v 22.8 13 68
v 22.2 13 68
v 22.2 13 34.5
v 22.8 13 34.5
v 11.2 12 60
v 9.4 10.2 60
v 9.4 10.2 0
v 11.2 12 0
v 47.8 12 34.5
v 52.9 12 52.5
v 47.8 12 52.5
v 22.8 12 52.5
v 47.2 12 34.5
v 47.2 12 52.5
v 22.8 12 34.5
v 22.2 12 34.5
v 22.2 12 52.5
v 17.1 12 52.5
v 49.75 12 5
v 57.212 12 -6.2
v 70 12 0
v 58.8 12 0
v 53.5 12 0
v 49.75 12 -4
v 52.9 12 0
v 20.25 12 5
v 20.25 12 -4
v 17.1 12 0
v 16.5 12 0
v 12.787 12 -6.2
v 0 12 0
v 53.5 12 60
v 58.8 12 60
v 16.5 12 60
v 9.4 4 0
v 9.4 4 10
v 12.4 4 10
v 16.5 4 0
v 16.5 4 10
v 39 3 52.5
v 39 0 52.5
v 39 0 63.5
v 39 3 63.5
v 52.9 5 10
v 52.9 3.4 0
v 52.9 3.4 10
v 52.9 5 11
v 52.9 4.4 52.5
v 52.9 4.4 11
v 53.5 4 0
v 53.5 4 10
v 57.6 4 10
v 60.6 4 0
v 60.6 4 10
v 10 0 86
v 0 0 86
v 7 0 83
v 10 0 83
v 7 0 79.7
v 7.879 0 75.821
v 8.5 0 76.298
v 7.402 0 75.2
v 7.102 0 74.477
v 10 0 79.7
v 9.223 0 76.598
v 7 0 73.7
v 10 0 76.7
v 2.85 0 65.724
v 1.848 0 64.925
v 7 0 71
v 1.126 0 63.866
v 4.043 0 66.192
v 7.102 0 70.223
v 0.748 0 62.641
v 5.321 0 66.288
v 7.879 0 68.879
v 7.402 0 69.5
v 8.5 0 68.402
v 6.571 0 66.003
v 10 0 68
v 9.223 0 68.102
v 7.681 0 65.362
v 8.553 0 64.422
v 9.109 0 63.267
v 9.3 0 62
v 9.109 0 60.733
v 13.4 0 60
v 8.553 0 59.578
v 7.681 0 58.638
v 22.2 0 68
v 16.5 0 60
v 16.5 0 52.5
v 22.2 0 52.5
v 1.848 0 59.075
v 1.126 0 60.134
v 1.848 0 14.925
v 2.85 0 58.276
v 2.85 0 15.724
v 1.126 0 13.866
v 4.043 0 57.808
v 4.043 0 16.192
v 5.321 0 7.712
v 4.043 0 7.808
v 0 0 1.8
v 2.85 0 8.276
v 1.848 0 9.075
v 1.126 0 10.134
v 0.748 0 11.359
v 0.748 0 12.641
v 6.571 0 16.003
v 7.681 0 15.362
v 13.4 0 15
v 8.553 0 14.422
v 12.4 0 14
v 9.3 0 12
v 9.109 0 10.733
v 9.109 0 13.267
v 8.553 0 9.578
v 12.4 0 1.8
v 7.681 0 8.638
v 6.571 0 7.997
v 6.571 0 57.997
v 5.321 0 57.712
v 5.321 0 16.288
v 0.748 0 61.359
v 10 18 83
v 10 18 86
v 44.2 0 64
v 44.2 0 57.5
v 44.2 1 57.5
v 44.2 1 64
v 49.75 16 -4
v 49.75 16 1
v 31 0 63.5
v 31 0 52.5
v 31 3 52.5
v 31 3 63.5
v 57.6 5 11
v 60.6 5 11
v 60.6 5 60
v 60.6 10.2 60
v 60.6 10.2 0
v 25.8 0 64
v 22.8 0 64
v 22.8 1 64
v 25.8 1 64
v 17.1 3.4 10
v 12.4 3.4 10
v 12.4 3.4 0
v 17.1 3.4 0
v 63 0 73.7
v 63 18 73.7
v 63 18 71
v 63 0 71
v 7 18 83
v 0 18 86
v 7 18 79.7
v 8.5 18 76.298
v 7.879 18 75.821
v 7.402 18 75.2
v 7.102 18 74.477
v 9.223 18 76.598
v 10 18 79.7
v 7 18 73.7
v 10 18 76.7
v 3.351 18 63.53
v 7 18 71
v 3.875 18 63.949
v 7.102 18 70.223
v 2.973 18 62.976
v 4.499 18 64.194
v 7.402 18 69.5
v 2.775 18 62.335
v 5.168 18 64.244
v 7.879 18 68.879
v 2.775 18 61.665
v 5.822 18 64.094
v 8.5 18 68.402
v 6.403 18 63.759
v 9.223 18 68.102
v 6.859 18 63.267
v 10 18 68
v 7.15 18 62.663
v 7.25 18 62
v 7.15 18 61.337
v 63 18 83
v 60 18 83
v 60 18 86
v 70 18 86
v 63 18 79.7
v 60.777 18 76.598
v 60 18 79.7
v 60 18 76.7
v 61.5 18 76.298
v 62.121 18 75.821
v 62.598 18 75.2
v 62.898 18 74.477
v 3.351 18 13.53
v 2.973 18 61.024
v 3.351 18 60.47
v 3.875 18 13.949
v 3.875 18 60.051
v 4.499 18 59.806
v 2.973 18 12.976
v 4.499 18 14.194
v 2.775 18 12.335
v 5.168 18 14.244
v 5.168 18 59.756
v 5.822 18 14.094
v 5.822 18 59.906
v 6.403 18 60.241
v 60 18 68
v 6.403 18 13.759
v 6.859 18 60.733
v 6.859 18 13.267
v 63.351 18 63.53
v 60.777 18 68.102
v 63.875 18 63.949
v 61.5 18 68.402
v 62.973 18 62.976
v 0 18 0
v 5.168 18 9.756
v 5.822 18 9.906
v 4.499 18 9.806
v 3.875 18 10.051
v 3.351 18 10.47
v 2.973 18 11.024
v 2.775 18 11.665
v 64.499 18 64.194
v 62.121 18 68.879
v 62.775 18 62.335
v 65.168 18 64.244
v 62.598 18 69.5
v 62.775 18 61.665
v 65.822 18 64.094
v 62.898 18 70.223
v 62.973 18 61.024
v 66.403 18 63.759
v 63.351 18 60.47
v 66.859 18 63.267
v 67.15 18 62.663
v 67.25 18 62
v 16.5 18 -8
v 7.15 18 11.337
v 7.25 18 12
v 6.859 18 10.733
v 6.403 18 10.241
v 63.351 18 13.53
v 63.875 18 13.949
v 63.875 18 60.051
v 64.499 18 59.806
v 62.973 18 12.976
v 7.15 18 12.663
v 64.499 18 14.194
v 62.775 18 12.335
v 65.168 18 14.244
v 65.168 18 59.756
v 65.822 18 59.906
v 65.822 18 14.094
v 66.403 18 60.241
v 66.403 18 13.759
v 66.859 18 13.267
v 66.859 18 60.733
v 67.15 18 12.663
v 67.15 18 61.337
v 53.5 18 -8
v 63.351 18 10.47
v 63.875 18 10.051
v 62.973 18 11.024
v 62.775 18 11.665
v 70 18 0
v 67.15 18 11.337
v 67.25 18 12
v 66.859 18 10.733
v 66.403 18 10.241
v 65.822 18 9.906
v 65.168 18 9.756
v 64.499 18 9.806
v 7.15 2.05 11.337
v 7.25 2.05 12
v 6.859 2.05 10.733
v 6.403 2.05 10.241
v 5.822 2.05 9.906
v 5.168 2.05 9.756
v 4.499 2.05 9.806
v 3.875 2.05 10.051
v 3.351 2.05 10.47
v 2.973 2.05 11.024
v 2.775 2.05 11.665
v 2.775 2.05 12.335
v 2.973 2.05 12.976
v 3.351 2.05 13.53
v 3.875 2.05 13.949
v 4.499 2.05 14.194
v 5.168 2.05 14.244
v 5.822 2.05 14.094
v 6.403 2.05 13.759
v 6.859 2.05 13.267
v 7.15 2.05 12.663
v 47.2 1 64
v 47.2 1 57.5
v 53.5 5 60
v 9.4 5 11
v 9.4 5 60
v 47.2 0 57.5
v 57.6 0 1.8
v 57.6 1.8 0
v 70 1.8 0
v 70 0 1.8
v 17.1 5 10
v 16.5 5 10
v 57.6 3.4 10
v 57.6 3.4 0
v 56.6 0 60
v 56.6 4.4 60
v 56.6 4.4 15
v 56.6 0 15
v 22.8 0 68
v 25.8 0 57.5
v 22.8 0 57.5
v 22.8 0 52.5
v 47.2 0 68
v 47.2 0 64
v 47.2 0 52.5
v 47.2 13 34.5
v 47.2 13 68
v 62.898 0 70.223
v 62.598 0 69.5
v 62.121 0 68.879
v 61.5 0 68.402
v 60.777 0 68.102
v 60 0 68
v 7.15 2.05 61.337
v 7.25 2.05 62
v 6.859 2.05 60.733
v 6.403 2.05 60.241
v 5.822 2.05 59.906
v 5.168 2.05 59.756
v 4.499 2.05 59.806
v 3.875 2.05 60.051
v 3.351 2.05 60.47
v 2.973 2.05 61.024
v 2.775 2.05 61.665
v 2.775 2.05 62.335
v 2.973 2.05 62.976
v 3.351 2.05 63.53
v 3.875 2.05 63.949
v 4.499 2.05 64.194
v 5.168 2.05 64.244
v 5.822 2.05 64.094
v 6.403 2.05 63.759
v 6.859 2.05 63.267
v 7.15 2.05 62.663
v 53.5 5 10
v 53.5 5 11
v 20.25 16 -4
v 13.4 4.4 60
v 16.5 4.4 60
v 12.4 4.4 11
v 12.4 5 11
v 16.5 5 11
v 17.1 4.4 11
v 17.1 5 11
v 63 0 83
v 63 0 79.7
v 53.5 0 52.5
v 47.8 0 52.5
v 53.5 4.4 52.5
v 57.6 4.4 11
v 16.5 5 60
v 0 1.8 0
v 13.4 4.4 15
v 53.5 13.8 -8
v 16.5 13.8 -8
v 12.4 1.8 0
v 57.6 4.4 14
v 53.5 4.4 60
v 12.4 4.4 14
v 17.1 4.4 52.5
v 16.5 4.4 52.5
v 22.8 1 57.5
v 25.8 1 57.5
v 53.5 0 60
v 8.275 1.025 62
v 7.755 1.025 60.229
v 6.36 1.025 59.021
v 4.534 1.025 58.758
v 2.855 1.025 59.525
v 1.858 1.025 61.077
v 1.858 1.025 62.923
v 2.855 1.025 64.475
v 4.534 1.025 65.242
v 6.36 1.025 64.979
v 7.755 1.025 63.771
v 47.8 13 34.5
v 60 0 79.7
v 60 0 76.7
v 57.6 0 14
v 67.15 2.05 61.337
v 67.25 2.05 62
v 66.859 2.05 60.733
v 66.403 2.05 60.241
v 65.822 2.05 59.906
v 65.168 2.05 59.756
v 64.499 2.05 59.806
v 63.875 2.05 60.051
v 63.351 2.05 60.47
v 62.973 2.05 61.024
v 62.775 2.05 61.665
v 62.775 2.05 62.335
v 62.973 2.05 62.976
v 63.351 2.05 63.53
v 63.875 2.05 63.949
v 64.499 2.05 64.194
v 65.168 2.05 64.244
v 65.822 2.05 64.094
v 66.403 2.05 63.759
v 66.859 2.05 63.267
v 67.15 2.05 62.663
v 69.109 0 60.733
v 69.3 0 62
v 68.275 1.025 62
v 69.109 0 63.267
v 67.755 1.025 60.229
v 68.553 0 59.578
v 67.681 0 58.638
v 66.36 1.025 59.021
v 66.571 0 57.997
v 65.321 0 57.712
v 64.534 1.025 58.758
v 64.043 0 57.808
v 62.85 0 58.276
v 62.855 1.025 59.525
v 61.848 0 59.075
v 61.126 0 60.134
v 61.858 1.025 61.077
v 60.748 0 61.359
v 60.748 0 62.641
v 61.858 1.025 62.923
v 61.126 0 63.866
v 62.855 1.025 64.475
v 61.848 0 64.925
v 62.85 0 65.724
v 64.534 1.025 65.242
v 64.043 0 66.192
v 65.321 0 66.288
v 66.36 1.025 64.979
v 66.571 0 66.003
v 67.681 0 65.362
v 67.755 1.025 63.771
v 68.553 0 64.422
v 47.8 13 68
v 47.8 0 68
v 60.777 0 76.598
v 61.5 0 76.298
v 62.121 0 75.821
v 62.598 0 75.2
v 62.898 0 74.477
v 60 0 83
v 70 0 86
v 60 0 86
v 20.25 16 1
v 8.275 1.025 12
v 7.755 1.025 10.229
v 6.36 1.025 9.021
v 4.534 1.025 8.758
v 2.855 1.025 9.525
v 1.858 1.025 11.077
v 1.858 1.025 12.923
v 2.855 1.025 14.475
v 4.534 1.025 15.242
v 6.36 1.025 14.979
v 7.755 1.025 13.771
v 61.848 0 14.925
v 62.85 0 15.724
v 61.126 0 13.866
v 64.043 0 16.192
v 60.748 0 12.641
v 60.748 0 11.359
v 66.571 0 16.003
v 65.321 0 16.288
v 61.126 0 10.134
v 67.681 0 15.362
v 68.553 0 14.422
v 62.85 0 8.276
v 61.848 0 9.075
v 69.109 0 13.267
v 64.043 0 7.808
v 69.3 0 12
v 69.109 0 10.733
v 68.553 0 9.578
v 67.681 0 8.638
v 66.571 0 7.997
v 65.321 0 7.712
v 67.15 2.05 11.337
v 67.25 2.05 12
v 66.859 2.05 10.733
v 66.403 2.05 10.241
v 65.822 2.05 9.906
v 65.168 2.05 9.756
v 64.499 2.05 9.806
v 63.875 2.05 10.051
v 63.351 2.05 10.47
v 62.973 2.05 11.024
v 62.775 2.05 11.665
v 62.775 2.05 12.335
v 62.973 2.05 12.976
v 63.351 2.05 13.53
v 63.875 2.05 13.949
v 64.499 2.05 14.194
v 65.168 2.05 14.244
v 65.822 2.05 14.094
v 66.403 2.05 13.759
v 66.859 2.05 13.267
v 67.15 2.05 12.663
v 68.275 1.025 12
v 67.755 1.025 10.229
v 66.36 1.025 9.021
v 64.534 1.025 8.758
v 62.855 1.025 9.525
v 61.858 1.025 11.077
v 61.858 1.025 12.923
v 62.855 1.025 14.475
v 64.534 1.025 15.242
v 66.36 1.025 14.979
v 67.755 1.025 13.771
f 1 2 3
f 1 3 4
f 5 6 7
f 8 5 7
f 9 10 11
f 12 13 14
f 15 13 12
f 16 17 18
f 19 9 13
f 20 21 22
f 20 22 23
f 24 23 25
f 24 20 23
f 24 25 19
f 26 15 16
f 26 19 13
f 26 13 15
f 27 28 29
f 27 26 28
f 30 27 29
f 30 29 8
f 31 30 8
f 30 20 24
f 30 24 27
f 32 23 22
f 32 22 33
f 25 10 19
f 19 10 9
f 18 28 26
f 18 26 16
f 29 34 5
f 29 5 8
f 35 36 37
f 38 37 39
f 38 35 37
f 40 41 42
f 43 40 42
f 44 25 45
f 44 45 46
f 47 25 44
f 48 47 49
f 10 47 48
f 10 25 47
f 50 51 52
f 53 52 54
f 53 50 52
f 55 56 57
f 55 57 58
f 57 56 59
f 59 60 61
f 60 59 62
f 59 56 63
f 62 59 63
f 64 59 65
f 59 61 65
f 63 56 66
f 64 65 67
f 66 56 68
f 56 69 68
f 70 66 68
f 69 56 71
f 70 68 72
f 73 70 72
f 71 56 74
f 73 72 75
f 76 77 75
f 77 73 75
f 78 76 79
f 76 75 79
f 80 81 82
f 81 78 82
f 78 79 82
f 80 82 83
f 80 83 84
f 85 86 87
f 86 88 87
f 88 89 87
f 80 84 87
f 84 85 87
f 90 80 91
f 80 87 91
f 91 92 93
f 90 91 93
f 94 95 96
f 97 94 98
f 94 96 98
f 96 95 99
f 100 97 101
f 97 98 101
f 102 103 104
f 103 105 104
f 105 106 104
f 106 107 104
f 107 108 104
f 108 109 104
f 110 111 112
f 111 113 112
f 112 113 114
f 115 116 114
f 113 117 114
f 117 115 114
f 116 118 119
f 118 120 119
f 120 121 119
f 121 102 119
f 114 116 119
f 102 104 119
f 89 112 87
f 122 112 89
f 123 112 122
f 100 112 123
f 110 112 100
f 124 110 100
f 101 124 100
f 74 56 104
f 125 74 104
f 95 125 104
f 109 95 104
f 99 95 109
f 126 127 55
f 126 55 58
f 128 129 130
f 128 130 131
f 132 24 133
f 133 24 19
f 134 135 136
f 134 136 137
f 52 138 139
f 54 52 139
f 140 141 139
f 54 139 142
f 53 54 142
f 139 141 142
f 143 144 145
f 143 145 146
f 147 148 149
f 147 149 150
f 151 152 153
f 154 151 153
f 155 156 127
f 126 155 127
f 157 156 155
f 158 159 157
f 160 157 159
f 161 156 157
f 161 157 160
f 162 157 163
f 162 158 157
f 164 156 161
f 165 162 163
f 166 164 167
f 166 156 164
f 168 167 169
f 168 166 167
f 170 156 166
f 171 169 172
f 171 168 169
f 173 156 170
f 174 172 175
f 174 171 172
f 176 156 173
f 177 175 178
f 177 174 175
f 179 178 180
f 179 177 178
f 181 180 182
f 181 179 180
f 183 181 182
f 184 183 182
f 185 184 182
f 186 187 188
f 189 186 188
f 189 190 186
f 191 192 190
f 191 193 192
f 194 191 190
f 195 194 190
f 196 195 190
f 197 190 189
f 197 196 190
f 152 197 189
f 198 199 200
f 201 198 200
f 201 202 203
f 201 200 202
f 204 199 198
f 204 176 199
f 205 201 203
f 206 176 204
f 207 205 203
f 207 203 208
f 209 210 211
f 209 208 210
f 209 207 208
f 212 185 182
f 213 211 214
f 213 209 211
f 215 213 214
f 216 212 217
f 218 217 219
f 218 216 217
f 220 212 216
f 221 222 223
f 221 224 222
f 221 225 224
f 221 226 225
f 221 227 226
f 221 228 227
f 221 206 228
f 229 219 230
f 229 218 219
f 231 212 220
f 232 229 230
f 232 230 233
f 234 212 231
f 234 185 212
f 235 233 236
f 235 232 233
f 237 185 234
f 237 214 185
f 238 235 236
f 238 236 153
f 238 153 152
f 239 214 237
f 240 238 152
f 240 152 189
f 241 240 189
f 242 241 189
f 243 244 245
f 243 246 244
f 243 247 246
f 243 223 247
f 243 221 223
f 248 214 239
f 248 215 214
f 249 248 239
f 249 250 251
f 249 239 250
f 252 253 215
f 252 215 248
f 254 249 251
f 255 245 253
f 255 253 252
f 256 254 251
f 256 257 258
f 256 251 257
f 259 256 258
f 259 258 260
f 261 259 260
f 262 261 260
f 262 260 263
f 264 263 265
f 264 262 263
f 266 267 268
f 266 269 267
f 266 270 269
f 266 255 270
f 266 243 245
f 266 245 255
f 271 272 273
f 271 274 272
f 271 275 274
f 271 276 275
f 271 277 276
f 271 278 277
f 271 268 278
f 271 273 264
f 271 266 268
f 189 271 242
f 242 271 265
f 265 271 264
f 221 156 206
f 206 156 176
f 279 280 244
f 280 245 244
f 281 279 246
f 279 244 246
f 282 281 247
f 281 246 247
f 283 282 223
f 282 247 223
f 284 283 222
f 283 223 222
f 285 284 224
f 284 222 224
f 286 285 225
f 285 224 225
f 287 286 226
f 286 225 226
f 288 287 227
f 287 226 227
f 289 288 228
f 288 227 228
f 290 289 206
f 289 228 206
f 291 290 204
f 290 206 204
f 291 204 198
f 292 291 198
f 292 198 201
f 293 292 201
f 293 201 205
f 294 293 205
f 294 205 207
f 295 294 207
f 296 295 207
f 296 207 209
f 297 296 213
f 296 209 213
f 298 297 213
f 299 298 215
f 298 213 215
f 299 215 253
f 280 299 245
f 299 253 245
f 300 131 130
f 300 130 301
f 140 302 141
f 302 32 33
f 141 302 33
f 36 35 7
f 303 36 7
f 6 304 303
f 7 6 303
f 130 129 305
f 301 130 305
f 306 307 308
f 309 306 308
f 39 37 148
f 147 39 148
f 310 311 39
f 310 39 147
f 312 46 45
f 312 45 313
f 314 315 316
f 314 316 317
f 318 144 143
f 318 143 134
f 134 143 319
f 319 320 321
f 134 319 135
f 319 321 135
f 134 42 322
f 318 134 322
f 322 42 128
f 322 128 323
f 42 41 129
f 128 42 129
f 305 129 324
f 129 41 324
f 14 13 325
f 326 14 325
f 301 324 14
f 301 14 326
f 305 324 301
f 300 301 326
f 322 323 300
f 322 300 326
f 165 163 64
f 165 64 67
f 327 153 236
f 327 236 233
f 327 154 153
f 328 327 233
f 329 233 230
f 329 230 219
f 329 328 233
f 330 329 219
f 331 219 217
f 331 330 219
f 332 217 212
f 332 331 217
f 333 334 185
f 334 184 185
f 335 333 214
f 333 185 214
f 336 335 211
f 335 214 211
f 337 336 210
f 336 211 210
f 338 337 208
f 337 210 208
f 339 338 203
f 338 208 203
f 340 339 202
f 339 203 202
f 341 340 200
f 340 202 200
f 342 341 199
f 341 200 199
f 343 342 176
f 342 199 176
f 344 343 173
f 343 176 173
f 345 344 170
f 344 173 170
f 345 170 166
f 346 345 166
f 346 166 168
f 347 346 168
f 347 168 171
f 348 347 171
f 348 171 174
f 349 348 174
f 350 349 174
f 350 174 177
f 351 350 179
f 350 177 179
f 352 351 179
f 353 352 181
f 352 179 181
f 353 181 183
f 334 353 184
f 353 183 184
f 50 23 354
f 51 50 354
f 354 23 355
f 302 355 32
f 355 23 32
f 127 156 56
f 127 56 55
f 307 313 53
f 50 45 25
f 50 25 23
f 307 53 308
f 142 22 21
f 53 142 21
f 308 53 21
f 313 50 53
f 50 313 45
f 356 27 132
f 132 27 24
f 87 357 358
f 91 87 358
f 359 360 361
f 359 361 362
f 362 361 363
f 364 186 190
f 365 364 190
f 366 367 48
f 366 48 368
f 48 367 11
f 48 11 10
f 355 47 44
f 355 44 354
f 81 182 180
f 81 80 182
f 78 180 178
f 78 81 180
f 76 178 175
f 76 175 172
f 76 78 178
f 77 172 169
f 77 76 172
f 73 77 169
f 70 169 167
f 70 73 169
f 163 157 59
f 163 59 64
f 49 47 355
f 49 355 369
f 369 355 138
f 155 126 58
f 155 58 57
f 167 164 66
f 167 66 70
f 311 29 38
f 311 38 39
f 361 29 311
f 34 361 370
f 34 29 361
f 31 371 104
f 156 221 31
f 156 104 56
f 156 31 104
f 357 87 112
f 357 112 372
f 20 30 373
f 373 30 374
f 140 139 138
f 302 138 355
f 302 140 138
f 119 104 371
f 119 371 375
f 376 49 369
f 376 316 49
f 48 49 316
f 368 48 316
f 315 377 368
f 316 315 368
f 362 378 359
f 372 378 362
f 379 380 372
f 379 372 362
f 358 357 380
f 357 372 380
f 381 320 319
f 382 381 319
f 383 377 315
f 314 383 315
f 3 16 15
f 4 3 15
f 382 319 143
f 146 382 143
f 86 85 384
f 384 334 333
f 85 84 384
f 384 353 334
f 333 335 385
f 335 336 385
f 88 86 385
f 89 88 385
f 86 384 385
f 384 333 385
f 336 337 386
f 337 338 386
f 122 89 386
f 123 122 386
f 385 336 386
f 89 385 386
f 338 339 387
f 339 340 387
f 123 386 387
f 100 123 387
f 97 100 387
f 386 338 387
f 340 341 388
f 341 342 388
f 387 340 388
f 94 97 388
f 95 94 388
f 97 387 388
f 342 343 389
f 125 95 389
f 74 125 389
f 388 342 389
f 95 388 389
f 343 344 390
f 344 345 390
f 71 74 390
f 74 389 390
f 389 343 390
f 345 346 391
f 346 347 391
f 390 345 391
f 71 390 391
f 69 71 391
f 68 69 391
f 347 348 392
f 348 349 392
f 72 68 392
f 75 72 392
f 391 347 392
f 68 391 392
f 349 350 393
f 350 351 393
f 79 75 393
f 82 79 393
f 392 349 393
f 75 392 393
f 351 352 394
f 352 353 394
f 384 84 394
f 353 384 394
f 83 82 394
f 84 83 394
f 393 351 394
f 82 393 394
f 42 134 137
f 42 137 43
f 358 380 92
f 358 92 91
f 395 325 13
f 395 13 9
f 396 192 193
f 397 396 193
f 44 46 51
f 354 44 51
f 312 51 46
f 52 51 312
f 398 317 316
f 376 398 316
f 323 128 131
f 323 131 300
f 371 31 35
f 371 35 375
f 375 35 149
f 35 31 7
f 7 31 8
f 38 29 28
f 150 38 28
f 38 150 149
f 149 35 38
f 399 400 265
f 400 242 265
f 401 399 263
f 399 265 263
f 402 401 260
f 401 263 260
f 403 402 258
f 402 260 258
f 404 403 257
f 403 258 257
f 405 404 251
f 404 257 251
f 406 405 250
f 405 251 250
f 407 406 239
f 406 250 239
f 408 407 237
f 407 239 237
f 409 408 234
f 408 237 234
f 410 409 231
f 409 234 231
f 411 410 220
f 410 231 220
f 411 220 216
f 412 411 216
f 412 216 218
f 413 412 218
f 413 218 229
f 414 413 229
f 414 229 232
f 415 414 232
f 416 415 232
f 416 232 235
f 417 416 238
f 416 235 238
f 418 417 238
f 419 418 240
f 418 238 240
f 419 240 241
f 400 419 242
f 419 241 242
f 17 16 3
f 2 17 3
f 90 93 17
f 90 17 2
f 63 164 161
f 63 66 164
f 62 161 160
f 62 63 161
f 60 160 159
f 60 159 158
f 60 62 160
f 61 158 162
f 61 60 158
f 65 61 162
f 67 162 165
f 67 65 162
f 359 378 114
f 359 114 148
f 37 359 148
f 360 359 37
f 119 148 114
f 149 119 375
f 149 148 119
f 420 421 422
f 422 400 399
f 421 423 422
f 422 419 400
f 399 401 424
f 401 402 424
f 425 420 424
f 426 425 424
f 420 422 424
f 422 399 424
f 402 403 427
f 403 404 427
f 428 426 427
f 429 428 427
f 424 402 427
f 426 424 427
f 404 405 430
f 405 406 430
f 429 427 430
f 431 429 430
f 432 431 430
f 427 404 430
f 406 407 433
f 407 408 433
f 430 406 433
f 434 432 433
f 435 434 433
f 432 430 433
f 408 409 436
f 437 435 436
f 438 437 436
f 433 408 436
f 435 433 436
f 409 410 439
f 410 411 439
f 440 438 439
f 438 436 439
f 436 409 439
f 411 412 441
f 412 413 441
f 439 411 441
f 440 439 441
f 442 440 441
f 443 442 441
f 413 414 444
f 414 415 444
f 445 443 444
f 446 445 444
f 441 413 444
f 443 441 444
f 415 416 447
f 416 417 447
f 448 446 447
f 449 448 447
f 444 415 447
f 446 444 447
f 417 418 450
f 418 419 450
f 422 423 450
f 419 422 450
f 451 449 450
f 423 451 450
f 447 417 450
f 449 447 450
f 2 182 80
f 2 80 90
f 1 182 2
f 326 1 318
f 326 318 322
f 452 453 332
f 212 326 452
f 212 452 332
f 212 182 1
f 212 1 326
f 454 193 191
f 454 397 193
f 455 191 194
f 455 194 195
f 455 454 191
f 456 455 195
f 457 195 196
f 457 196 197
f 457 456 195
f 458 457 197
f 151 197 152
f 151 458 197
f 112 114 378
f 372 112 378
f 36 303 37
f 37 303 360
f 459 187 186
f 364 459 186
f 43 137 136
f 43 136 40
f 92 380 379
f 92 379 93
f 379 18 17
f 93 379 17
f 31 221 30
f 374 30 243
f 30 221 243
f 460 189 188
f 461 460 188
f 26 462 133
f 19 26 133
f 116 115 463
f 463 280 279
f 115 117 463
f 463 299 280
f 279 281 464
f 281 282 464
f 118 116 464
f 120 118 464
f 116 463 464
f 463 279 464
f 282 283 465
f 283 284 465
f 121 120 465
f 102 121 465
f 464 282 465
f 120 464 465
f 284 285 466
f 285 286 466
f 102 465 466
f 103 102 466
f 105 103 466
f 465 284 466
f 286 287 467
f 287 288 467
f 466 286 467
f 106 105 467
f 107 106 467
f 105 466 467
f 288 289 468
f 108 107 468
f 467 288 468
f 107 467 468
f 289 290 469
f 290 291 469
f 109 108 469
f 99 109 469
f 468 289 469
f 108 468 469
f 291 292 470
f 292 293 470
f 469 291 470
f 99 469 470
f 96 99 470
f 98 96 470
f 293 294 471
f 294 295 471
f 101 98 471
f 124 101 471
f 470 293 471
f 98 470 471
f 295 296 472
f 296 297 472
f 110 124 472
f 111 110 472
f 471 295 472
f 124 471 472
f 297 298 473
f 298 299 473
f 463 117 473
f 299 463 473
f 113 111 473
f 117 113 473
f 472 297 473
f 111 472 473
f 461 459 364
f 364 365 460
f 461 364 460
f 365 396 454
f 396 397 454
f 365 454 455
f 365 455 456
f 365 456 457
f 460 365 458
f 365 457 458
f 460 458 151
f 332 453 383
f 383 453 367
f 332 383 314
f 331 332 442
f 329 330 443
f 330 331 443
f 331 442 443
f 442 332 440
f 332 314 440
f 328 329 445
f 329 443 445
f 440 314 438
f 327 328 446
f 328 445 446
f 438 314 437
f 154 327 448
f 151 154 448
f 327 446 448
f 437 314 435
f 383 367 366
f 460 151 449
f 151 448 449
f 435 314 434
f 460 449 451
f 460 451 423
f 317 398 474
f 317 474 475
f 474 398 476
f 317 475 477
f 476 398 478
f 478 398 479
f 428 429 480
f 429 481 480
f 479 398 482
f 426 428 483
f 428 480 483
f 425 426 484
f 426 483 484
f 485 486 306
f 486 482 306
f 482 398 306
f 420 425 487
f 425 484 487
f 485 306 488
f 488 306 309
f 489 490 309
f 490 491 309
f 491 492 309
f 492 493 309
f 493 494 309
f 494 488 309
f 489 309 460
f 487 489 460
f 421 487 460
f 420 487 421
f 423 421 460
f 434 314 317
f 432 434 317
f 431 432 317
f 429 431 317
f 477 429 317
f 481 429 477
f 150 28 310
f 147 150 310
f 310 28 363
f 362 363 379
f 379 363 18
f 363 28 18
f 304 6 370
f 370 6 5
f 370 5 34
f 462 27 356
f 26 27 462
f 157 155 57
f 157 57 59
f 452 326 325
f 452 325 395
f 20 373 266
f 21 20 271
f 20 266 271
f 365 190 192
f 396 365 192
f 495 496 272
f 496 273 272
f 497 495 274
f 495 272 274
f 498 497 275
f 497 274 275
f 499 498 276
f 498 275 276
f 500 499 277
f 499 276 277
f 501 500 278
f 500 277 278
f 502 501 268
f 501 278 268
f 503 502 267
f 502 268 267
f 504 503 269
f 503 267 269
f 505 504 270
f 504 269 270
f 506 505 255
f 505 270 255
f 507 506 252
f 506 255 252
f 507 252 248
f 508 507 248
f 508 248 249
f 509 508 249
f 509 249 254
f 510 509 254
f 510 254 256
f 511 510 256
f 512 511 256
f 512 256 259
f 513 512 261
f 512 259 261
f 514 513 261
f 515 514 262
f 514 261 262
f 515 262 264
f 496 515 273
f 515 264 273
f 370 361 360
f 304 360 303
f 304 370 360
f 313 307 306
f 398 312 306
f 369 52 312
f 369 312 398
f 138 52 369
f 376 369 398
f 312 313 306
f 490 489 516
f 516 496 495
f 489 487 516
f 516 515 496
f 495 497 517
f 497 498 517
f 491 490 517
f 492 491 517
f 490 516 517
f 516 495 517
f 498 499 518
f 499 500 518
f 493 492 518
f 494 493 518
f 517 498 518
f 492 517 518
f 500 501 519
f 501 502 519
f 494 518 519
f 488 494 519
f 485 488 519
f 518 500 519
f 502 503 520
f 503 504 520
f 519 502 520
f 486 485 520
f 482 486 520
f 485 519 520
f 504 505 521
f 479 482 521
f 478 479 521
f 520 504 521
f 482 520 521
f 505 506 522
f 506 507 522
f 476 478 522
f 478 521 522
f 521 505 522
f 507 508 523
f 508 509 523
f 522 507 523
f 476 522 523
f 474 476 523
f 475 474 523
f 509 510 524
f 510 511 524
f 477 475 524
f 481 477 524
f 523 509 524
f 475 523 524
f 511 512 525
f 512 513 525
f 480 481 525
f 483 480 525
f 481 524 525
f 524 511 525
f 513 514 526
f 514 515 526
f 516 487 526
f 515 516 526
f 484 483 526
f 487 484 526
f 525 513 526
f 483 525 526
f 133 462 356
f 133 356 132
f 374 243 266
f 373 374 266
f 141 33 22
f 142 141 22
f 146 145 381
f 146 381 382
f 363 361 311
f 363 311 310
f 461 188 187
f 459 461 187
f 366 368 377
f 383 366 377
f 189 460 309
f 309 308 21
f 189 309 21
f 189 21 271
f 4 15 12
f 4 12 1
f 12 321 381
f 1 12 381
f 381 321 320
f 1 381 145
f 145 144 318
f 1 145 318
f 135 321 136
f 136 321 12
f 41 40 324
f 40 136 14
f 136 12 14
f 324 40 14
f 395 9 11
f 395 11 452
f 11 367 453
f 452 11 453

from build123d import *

# Parameters (mm, degrees)
SKETCH_1_W                = 70
SKETCH_1_H                = 18
EXTRUDE_1_DEPTH           = 60
CUT_EXTRUDE_1_DEPTH       = 94.936148527
SKETCH_3_W                = 15
SKETCH_3_H                = 5
CUT_EXTRUDE_2_DEPTH       = 1
SKETCH_4_W                = 15
SKETCH_4_H                = 5
CUT_EXTRUDE_3_DEPTH       = 1
SKETCH_5_W                = 3
SKETCH_5_H                = 11
CUT_EXTRUDE_4_DEPTH       = 1
SKETCH_6_W                = 3
SKETCH_6_H                = 11
CUT_EXTRUDE_5_DEPTH       = 1
CHAMFER_1_SIZE            = 1
EXTRUDE_9_DEPTH           = 6
SKETCH_7_W                = 29.5
SKETCH_7_H                = 9
CUT_EXTRUDE_7_DEPTH       = 4
SKETCH_9_W                = 37
SKETCH_9_H                = 7.5
EXTRUDE_3_DEPTH           = 12
SKETCH_10_W               = 70
SKETCH_10_H               = 18
EXTRUDE_4_DEPTH           = 8
CHAMFER_4_SIZE            = 4
SKETCH_11_W               = 8
SKETCH_11_H               = 11
CUT_EXTRUDE_8_DEPTH       = 3
SKETCH_12_W               = 0.6
SKETCH_12_H               = 33.5
CUT_EXTRUDE_9_DEPTH       = 13
SKETCH_13_W               = 0.6
SKETCH_13_H               = 52.5
EXTRUDE_5_DEPTH           = 7
SKETCH_14_W               = 0.6
SKETCH_14_H               = 10
EXTRUDE_6_DEPTH           = 1
SKETCH_15_W               = 7.7
SKETCH_15_H               = 49
EXTRUDE_7_DEPTH           = 0.6
SKETCH_18_W               = 7.7
SKETCH_18_H               = 10
EXTRUDE_8_DEPTH           = 0.6
CHAMFER_5_SIZE            = 1.8
SKETCH_22_W               = 3
SKETCH_22_H               = 6.5
CUT_EXTRUDE_10_DEPTH      = 1
EXTRUDE_10_DEPTH          = 18
FILLET_1_R                = 3
HOLE_WIZARD_2_D           = 4.5
HOLE_WIZARD_2_CSINK_D     = 8.6
HOLE_WIZARD_2_CSINK_ANGLE = 90


with BuildPart() as part:
    # 草图1 → 凸台-拉伸1 (new body)
    with BuildSketch(Plane.XY):
        with Locations((35, 9)):
            Rectangle(SKETCH_1_W, SKETCH_1_H)
    extrude(amount=EXTRUDE_1_DEPTH)

    # 草图2 → 切除-拉伸1 (cut, through all)
    with BuildSketch(Plane.XY.offset(60)):
        Polygon((13.4, 0), (13.4, 5), (9.4, 5), (9.4, 12), (60.6, 12), (60.6, 5), (56.6, 5), (56.6, 0), align=None)
    extrude(amount=-CUT_EXTRUDE_1_DEPTH, mode=Mode.SUBTRACT)

    # 草图3 → 切除-拉伸2 (cut)
    with BuildSketch(Plane(origin=(13.4, 0, 0), x_dir=(0, 0, -1), z_dir=(1, 0, 0))):
        with Locations((-7.5, 2.5)):
            Rectangle(SKETCH_3_W, SKETCH_3_H)
    extrude(amount=-CUT_EXTRUDE_2_DEPTH, mode=Mode.SUBTRACT)

    # 草图4 → 切除-拉伸3 (cut)
    with BuildSketch(Plane.ZY.offset(-56.6)):
        with Locations((7.5, 2.5)):
            Rectangle(SKETCH_4_W, SKETCH_4_H)
    extrude(amount=-CUT_EXTRUDE_3_DEPTH, mode=Mode.SUBTRACT)

    # 草图5 → 切除-拉伸4 (cut)
    with BuildSketch(Plane(origin=(0, 5, 0), x_dir=(1, 0, 0), z_dir=(0, 1, 0))):
        with Locations((59.1, -5.5)):
            Rectangle(SKETCH_5_W, SKETCH_5_H)
    extrude(amount=-CUT_EXTRUDE_4_DEPTH, mode=Mode.SUBTRACT)

    # 草图6 → 切除-拉伸5 (cut)
    with BuildSketch(Plane(origin=(0, 5, 0), x_dir=(1, 0, 0), z_dir=(0, 1, 0))):
        with Locations((10.9, -5.5)):
            Rectangle(SKETCH_6_W, SKETCH_6_H)
    extrude(amount=-CUT_EXTRUDE_5_DEPTH, mode=Mode.SUBTRACT)

    # 倒角1
    chamfer_1_edges = [part.edges().sort_by_distance(p)[0] for p in [
        (59.1, 4, 11),
        (10.9, 4, 11),
        (12.4, 2.5, 15),
        (57.6, 2.5, 15),
    ]]
    chamfer(chamfer_1_edges, length=CHAMFER_1_SIZE - 0.0001)  # a hair under: the kernel refuses the full size

    # 草图21 → 凸台-拉伸9 (add)
    with BuildSketch(Plane(origin=(0, 18, 0), x_dir=(1, 0, 0), z_dir=(0, 1, 0))):
        Polygon((0, 0), (16.5, 8), (53.5, 8), (70, 0), align=None)
    extrude(amount=-EXTRUDE_9_DEPTH)

    # 草图7 → 切除-拉伸7 (cut)
    with BuildSketch(Plane.XZ.offset(-12)):
        with Locations((35, 0.5)):
            Rectangle(SKETCH_7_W, SKETCH_7_H)
    extrude(amount=-CUT_EXTRUDE_7_DEPTH, mode=Mode.SUBTRACT)

    # 草图9 → 凸台-拉伸3 (add)
    with BuildSketch(Plane.XZ.offset(-12)):
        with Locations((35, 56.25)):
            Rectangle(SKETCH_9_W, SKETCH_9_H)
    extrude(amount=EXTRUDE_3_DEPTH)

    # 草图10 → 凸台-拉伸4 (add)
    with BuildSketch(Plane.XY.offset(60)):
        with Locations((35, 9)):
            Rectangle(SKETCH_10_W, SKETCH_10_H)
    extrude(amount=EXTRUDE_4_DEPTH)

    # 倒角4
    chamfer_4_edges = [part.edges().sort_by_distance(p)[0] for p in [
        (35, 16, 5),
    ]]
    chamfer(chamfer_4_edges, length=CHAMFER_4_SIZE - 0.0001)  # a hair under: the kernel refuses the full size

    # 草图11 → 切除-拉伸8 (cut)
    with BuildSketch(Plane.XZ):
        with Locations((35, 58)):
            Rectangle(SKETCH_11_W, SKETCH_11_H)
    extrude(amount=-CUT_EXTRUDE_8_DEPTH, mode=Mode.SUBTRACT)

    # 草图12 → 切除-拉伸9 (cut)
    with BuildSketch(Plane.XZ):
        with Locations((22.5, 51.25)):
            Rectangle(SKETCH_12_W, SKETCH_12_H)
        with Locations((47.5, 51.25)):
            Rectangle(SKETCH_12_W, SKETCH_12_H)
    extrude(amount=-CUT_EXTRUDE_9_DEPTH, mode=Mode.SUBTRACT)

    # 草图13 → 凸台-拉伸5 (add)
    with BuildSketch(Plane.XZ.offset(-12)):
        with Locations((16.8, 26.25)):
            Rectangle(SKETCH_13_W, SKETCH_13_H)
        with Locations((53.2, 26.25)):
            Rectangle(SKETCH_13_W, SKETCH_13_H)
    extrude(amount=EXTRUDE_5_DEPTH)

    # 草图14 → 凸台-拉伸6 (add)
    with BuildSketch(Plane.XZ.offset(-5)):
        with Locations((16.8, 5)):
            Rectangle(SKETCH_14_W, SKETCH_14_H)
        with Locations((53.2, 5)):
            Rectangle(SKETCH_14_W, SKETCH_14_H)
    extrude(amount=EXTRUDE_6_DEPTH)

    # 草图15 → 凸台-拉伸7 (add)
    with BuildSketch(Plane.XZ.offset(-5)):
        with Locations((13.25, 35.5)):
            Rectangle(SKETCH_15_W, SKETCH_15_H)
        with Locations((56.75, 35.5)):
            Rectangle(SKETCH_15_W, SKETCH_15_H)
    extrude(amount=EXTRUDE_7_DEPTH)

    # 草图18 → 凸台-拉伸8 (add)
    with BuildSketch(Plane.XZ.offset(-4)):
        with Locations((13.25, 5)):
            Rectangle(SKETCH_18_W, SKETCH_18_H)
        with Locations((56.75, 5)):
            Rectangle(SKETCH_18_W, SKETCH_18_H)
    extrude(amount=EXTRUDE_8_DEPTH)

    # 倒角5
    chamfer_5_edges = [part.edges().sort_by_distance(p)[0] for p in [
        (35, 12, -8),
        (9.4, 12, 30),
        (60.6, 12, 30),
        (6.2, 0, 0),
        (63.8, 0, 0),
    ]]
    chamfer(chamfer_5_edges, length=CHAMFER_5_SIZE)

    # 草图22 → 切除-拉伸10 (cut)
    with BuildSketch(Plane.XZ):
        with Locations((24.3, 60.75)):
            Rectangle(SKETCH_22_W, SKETCH_22_H)
        with Locations((45.7, 60.75)):
            Rectangle(SKETCH_22_W, SKETCH_22_H)
    extrude(amount=-CUT_EXTRUDE_10_DEPTH, mode=Mode.SUBTRACT)

    # 草图23 → 凸台-拉伸10 (add)
    with BuildSketch(Plane(origin=(0, 18, 0), x_dir=(1, 0, 0), z_dir=(0, 1, 0))):
        Polygon((0, -68), (0, -86), (10, -86), (10, -83), (7, -83), (7, -79.7), (10, -79.7), (10, -76.7), (7, -76.7), (7, -68), align=None)
        Polygon((63, -68), (70, -68), (70, -86), (60, -86), (60, -83), (63, -83), (63, -79.7), (60, -79.7), (60, -76.7), (63, -76.7), align=None)
    extrude(amount=-EXTRUDE_10_DEPTH)

    # 圆角1
    fillet_1_edges = [part.edges().sort_by_distance(p)[0] for p in [
        (7, 9, 76.7),
        (7, 9, 68),
        (63, 9, 68),
        (63, 9, 76.7),
    ]]
    fillet(fillet_1_edges, radius=FILLET_1_R - 0.0001)  # a hair under: the kernel refuses the full size

    # 打孔尺寸(%根据十字)槽半沉头木螺钉的类型2 (through all)
    with Locations(Plane(origin=(0, 0, 0), x_dir=(-1, 0, 0), z_dir=(0, -1, 0))):
        with Locations((-65, -12), (-65, -62), (-5, -12), (-5, -62)):
            CounterSinkHole(HOLE_WIZARD_2_D / 2, HOLE_WIZARD_2_CSINK_D / 2, counter_sink_angle=HOLE_WIZARD_2_CSINK_ANGLE)


solid = part.part
